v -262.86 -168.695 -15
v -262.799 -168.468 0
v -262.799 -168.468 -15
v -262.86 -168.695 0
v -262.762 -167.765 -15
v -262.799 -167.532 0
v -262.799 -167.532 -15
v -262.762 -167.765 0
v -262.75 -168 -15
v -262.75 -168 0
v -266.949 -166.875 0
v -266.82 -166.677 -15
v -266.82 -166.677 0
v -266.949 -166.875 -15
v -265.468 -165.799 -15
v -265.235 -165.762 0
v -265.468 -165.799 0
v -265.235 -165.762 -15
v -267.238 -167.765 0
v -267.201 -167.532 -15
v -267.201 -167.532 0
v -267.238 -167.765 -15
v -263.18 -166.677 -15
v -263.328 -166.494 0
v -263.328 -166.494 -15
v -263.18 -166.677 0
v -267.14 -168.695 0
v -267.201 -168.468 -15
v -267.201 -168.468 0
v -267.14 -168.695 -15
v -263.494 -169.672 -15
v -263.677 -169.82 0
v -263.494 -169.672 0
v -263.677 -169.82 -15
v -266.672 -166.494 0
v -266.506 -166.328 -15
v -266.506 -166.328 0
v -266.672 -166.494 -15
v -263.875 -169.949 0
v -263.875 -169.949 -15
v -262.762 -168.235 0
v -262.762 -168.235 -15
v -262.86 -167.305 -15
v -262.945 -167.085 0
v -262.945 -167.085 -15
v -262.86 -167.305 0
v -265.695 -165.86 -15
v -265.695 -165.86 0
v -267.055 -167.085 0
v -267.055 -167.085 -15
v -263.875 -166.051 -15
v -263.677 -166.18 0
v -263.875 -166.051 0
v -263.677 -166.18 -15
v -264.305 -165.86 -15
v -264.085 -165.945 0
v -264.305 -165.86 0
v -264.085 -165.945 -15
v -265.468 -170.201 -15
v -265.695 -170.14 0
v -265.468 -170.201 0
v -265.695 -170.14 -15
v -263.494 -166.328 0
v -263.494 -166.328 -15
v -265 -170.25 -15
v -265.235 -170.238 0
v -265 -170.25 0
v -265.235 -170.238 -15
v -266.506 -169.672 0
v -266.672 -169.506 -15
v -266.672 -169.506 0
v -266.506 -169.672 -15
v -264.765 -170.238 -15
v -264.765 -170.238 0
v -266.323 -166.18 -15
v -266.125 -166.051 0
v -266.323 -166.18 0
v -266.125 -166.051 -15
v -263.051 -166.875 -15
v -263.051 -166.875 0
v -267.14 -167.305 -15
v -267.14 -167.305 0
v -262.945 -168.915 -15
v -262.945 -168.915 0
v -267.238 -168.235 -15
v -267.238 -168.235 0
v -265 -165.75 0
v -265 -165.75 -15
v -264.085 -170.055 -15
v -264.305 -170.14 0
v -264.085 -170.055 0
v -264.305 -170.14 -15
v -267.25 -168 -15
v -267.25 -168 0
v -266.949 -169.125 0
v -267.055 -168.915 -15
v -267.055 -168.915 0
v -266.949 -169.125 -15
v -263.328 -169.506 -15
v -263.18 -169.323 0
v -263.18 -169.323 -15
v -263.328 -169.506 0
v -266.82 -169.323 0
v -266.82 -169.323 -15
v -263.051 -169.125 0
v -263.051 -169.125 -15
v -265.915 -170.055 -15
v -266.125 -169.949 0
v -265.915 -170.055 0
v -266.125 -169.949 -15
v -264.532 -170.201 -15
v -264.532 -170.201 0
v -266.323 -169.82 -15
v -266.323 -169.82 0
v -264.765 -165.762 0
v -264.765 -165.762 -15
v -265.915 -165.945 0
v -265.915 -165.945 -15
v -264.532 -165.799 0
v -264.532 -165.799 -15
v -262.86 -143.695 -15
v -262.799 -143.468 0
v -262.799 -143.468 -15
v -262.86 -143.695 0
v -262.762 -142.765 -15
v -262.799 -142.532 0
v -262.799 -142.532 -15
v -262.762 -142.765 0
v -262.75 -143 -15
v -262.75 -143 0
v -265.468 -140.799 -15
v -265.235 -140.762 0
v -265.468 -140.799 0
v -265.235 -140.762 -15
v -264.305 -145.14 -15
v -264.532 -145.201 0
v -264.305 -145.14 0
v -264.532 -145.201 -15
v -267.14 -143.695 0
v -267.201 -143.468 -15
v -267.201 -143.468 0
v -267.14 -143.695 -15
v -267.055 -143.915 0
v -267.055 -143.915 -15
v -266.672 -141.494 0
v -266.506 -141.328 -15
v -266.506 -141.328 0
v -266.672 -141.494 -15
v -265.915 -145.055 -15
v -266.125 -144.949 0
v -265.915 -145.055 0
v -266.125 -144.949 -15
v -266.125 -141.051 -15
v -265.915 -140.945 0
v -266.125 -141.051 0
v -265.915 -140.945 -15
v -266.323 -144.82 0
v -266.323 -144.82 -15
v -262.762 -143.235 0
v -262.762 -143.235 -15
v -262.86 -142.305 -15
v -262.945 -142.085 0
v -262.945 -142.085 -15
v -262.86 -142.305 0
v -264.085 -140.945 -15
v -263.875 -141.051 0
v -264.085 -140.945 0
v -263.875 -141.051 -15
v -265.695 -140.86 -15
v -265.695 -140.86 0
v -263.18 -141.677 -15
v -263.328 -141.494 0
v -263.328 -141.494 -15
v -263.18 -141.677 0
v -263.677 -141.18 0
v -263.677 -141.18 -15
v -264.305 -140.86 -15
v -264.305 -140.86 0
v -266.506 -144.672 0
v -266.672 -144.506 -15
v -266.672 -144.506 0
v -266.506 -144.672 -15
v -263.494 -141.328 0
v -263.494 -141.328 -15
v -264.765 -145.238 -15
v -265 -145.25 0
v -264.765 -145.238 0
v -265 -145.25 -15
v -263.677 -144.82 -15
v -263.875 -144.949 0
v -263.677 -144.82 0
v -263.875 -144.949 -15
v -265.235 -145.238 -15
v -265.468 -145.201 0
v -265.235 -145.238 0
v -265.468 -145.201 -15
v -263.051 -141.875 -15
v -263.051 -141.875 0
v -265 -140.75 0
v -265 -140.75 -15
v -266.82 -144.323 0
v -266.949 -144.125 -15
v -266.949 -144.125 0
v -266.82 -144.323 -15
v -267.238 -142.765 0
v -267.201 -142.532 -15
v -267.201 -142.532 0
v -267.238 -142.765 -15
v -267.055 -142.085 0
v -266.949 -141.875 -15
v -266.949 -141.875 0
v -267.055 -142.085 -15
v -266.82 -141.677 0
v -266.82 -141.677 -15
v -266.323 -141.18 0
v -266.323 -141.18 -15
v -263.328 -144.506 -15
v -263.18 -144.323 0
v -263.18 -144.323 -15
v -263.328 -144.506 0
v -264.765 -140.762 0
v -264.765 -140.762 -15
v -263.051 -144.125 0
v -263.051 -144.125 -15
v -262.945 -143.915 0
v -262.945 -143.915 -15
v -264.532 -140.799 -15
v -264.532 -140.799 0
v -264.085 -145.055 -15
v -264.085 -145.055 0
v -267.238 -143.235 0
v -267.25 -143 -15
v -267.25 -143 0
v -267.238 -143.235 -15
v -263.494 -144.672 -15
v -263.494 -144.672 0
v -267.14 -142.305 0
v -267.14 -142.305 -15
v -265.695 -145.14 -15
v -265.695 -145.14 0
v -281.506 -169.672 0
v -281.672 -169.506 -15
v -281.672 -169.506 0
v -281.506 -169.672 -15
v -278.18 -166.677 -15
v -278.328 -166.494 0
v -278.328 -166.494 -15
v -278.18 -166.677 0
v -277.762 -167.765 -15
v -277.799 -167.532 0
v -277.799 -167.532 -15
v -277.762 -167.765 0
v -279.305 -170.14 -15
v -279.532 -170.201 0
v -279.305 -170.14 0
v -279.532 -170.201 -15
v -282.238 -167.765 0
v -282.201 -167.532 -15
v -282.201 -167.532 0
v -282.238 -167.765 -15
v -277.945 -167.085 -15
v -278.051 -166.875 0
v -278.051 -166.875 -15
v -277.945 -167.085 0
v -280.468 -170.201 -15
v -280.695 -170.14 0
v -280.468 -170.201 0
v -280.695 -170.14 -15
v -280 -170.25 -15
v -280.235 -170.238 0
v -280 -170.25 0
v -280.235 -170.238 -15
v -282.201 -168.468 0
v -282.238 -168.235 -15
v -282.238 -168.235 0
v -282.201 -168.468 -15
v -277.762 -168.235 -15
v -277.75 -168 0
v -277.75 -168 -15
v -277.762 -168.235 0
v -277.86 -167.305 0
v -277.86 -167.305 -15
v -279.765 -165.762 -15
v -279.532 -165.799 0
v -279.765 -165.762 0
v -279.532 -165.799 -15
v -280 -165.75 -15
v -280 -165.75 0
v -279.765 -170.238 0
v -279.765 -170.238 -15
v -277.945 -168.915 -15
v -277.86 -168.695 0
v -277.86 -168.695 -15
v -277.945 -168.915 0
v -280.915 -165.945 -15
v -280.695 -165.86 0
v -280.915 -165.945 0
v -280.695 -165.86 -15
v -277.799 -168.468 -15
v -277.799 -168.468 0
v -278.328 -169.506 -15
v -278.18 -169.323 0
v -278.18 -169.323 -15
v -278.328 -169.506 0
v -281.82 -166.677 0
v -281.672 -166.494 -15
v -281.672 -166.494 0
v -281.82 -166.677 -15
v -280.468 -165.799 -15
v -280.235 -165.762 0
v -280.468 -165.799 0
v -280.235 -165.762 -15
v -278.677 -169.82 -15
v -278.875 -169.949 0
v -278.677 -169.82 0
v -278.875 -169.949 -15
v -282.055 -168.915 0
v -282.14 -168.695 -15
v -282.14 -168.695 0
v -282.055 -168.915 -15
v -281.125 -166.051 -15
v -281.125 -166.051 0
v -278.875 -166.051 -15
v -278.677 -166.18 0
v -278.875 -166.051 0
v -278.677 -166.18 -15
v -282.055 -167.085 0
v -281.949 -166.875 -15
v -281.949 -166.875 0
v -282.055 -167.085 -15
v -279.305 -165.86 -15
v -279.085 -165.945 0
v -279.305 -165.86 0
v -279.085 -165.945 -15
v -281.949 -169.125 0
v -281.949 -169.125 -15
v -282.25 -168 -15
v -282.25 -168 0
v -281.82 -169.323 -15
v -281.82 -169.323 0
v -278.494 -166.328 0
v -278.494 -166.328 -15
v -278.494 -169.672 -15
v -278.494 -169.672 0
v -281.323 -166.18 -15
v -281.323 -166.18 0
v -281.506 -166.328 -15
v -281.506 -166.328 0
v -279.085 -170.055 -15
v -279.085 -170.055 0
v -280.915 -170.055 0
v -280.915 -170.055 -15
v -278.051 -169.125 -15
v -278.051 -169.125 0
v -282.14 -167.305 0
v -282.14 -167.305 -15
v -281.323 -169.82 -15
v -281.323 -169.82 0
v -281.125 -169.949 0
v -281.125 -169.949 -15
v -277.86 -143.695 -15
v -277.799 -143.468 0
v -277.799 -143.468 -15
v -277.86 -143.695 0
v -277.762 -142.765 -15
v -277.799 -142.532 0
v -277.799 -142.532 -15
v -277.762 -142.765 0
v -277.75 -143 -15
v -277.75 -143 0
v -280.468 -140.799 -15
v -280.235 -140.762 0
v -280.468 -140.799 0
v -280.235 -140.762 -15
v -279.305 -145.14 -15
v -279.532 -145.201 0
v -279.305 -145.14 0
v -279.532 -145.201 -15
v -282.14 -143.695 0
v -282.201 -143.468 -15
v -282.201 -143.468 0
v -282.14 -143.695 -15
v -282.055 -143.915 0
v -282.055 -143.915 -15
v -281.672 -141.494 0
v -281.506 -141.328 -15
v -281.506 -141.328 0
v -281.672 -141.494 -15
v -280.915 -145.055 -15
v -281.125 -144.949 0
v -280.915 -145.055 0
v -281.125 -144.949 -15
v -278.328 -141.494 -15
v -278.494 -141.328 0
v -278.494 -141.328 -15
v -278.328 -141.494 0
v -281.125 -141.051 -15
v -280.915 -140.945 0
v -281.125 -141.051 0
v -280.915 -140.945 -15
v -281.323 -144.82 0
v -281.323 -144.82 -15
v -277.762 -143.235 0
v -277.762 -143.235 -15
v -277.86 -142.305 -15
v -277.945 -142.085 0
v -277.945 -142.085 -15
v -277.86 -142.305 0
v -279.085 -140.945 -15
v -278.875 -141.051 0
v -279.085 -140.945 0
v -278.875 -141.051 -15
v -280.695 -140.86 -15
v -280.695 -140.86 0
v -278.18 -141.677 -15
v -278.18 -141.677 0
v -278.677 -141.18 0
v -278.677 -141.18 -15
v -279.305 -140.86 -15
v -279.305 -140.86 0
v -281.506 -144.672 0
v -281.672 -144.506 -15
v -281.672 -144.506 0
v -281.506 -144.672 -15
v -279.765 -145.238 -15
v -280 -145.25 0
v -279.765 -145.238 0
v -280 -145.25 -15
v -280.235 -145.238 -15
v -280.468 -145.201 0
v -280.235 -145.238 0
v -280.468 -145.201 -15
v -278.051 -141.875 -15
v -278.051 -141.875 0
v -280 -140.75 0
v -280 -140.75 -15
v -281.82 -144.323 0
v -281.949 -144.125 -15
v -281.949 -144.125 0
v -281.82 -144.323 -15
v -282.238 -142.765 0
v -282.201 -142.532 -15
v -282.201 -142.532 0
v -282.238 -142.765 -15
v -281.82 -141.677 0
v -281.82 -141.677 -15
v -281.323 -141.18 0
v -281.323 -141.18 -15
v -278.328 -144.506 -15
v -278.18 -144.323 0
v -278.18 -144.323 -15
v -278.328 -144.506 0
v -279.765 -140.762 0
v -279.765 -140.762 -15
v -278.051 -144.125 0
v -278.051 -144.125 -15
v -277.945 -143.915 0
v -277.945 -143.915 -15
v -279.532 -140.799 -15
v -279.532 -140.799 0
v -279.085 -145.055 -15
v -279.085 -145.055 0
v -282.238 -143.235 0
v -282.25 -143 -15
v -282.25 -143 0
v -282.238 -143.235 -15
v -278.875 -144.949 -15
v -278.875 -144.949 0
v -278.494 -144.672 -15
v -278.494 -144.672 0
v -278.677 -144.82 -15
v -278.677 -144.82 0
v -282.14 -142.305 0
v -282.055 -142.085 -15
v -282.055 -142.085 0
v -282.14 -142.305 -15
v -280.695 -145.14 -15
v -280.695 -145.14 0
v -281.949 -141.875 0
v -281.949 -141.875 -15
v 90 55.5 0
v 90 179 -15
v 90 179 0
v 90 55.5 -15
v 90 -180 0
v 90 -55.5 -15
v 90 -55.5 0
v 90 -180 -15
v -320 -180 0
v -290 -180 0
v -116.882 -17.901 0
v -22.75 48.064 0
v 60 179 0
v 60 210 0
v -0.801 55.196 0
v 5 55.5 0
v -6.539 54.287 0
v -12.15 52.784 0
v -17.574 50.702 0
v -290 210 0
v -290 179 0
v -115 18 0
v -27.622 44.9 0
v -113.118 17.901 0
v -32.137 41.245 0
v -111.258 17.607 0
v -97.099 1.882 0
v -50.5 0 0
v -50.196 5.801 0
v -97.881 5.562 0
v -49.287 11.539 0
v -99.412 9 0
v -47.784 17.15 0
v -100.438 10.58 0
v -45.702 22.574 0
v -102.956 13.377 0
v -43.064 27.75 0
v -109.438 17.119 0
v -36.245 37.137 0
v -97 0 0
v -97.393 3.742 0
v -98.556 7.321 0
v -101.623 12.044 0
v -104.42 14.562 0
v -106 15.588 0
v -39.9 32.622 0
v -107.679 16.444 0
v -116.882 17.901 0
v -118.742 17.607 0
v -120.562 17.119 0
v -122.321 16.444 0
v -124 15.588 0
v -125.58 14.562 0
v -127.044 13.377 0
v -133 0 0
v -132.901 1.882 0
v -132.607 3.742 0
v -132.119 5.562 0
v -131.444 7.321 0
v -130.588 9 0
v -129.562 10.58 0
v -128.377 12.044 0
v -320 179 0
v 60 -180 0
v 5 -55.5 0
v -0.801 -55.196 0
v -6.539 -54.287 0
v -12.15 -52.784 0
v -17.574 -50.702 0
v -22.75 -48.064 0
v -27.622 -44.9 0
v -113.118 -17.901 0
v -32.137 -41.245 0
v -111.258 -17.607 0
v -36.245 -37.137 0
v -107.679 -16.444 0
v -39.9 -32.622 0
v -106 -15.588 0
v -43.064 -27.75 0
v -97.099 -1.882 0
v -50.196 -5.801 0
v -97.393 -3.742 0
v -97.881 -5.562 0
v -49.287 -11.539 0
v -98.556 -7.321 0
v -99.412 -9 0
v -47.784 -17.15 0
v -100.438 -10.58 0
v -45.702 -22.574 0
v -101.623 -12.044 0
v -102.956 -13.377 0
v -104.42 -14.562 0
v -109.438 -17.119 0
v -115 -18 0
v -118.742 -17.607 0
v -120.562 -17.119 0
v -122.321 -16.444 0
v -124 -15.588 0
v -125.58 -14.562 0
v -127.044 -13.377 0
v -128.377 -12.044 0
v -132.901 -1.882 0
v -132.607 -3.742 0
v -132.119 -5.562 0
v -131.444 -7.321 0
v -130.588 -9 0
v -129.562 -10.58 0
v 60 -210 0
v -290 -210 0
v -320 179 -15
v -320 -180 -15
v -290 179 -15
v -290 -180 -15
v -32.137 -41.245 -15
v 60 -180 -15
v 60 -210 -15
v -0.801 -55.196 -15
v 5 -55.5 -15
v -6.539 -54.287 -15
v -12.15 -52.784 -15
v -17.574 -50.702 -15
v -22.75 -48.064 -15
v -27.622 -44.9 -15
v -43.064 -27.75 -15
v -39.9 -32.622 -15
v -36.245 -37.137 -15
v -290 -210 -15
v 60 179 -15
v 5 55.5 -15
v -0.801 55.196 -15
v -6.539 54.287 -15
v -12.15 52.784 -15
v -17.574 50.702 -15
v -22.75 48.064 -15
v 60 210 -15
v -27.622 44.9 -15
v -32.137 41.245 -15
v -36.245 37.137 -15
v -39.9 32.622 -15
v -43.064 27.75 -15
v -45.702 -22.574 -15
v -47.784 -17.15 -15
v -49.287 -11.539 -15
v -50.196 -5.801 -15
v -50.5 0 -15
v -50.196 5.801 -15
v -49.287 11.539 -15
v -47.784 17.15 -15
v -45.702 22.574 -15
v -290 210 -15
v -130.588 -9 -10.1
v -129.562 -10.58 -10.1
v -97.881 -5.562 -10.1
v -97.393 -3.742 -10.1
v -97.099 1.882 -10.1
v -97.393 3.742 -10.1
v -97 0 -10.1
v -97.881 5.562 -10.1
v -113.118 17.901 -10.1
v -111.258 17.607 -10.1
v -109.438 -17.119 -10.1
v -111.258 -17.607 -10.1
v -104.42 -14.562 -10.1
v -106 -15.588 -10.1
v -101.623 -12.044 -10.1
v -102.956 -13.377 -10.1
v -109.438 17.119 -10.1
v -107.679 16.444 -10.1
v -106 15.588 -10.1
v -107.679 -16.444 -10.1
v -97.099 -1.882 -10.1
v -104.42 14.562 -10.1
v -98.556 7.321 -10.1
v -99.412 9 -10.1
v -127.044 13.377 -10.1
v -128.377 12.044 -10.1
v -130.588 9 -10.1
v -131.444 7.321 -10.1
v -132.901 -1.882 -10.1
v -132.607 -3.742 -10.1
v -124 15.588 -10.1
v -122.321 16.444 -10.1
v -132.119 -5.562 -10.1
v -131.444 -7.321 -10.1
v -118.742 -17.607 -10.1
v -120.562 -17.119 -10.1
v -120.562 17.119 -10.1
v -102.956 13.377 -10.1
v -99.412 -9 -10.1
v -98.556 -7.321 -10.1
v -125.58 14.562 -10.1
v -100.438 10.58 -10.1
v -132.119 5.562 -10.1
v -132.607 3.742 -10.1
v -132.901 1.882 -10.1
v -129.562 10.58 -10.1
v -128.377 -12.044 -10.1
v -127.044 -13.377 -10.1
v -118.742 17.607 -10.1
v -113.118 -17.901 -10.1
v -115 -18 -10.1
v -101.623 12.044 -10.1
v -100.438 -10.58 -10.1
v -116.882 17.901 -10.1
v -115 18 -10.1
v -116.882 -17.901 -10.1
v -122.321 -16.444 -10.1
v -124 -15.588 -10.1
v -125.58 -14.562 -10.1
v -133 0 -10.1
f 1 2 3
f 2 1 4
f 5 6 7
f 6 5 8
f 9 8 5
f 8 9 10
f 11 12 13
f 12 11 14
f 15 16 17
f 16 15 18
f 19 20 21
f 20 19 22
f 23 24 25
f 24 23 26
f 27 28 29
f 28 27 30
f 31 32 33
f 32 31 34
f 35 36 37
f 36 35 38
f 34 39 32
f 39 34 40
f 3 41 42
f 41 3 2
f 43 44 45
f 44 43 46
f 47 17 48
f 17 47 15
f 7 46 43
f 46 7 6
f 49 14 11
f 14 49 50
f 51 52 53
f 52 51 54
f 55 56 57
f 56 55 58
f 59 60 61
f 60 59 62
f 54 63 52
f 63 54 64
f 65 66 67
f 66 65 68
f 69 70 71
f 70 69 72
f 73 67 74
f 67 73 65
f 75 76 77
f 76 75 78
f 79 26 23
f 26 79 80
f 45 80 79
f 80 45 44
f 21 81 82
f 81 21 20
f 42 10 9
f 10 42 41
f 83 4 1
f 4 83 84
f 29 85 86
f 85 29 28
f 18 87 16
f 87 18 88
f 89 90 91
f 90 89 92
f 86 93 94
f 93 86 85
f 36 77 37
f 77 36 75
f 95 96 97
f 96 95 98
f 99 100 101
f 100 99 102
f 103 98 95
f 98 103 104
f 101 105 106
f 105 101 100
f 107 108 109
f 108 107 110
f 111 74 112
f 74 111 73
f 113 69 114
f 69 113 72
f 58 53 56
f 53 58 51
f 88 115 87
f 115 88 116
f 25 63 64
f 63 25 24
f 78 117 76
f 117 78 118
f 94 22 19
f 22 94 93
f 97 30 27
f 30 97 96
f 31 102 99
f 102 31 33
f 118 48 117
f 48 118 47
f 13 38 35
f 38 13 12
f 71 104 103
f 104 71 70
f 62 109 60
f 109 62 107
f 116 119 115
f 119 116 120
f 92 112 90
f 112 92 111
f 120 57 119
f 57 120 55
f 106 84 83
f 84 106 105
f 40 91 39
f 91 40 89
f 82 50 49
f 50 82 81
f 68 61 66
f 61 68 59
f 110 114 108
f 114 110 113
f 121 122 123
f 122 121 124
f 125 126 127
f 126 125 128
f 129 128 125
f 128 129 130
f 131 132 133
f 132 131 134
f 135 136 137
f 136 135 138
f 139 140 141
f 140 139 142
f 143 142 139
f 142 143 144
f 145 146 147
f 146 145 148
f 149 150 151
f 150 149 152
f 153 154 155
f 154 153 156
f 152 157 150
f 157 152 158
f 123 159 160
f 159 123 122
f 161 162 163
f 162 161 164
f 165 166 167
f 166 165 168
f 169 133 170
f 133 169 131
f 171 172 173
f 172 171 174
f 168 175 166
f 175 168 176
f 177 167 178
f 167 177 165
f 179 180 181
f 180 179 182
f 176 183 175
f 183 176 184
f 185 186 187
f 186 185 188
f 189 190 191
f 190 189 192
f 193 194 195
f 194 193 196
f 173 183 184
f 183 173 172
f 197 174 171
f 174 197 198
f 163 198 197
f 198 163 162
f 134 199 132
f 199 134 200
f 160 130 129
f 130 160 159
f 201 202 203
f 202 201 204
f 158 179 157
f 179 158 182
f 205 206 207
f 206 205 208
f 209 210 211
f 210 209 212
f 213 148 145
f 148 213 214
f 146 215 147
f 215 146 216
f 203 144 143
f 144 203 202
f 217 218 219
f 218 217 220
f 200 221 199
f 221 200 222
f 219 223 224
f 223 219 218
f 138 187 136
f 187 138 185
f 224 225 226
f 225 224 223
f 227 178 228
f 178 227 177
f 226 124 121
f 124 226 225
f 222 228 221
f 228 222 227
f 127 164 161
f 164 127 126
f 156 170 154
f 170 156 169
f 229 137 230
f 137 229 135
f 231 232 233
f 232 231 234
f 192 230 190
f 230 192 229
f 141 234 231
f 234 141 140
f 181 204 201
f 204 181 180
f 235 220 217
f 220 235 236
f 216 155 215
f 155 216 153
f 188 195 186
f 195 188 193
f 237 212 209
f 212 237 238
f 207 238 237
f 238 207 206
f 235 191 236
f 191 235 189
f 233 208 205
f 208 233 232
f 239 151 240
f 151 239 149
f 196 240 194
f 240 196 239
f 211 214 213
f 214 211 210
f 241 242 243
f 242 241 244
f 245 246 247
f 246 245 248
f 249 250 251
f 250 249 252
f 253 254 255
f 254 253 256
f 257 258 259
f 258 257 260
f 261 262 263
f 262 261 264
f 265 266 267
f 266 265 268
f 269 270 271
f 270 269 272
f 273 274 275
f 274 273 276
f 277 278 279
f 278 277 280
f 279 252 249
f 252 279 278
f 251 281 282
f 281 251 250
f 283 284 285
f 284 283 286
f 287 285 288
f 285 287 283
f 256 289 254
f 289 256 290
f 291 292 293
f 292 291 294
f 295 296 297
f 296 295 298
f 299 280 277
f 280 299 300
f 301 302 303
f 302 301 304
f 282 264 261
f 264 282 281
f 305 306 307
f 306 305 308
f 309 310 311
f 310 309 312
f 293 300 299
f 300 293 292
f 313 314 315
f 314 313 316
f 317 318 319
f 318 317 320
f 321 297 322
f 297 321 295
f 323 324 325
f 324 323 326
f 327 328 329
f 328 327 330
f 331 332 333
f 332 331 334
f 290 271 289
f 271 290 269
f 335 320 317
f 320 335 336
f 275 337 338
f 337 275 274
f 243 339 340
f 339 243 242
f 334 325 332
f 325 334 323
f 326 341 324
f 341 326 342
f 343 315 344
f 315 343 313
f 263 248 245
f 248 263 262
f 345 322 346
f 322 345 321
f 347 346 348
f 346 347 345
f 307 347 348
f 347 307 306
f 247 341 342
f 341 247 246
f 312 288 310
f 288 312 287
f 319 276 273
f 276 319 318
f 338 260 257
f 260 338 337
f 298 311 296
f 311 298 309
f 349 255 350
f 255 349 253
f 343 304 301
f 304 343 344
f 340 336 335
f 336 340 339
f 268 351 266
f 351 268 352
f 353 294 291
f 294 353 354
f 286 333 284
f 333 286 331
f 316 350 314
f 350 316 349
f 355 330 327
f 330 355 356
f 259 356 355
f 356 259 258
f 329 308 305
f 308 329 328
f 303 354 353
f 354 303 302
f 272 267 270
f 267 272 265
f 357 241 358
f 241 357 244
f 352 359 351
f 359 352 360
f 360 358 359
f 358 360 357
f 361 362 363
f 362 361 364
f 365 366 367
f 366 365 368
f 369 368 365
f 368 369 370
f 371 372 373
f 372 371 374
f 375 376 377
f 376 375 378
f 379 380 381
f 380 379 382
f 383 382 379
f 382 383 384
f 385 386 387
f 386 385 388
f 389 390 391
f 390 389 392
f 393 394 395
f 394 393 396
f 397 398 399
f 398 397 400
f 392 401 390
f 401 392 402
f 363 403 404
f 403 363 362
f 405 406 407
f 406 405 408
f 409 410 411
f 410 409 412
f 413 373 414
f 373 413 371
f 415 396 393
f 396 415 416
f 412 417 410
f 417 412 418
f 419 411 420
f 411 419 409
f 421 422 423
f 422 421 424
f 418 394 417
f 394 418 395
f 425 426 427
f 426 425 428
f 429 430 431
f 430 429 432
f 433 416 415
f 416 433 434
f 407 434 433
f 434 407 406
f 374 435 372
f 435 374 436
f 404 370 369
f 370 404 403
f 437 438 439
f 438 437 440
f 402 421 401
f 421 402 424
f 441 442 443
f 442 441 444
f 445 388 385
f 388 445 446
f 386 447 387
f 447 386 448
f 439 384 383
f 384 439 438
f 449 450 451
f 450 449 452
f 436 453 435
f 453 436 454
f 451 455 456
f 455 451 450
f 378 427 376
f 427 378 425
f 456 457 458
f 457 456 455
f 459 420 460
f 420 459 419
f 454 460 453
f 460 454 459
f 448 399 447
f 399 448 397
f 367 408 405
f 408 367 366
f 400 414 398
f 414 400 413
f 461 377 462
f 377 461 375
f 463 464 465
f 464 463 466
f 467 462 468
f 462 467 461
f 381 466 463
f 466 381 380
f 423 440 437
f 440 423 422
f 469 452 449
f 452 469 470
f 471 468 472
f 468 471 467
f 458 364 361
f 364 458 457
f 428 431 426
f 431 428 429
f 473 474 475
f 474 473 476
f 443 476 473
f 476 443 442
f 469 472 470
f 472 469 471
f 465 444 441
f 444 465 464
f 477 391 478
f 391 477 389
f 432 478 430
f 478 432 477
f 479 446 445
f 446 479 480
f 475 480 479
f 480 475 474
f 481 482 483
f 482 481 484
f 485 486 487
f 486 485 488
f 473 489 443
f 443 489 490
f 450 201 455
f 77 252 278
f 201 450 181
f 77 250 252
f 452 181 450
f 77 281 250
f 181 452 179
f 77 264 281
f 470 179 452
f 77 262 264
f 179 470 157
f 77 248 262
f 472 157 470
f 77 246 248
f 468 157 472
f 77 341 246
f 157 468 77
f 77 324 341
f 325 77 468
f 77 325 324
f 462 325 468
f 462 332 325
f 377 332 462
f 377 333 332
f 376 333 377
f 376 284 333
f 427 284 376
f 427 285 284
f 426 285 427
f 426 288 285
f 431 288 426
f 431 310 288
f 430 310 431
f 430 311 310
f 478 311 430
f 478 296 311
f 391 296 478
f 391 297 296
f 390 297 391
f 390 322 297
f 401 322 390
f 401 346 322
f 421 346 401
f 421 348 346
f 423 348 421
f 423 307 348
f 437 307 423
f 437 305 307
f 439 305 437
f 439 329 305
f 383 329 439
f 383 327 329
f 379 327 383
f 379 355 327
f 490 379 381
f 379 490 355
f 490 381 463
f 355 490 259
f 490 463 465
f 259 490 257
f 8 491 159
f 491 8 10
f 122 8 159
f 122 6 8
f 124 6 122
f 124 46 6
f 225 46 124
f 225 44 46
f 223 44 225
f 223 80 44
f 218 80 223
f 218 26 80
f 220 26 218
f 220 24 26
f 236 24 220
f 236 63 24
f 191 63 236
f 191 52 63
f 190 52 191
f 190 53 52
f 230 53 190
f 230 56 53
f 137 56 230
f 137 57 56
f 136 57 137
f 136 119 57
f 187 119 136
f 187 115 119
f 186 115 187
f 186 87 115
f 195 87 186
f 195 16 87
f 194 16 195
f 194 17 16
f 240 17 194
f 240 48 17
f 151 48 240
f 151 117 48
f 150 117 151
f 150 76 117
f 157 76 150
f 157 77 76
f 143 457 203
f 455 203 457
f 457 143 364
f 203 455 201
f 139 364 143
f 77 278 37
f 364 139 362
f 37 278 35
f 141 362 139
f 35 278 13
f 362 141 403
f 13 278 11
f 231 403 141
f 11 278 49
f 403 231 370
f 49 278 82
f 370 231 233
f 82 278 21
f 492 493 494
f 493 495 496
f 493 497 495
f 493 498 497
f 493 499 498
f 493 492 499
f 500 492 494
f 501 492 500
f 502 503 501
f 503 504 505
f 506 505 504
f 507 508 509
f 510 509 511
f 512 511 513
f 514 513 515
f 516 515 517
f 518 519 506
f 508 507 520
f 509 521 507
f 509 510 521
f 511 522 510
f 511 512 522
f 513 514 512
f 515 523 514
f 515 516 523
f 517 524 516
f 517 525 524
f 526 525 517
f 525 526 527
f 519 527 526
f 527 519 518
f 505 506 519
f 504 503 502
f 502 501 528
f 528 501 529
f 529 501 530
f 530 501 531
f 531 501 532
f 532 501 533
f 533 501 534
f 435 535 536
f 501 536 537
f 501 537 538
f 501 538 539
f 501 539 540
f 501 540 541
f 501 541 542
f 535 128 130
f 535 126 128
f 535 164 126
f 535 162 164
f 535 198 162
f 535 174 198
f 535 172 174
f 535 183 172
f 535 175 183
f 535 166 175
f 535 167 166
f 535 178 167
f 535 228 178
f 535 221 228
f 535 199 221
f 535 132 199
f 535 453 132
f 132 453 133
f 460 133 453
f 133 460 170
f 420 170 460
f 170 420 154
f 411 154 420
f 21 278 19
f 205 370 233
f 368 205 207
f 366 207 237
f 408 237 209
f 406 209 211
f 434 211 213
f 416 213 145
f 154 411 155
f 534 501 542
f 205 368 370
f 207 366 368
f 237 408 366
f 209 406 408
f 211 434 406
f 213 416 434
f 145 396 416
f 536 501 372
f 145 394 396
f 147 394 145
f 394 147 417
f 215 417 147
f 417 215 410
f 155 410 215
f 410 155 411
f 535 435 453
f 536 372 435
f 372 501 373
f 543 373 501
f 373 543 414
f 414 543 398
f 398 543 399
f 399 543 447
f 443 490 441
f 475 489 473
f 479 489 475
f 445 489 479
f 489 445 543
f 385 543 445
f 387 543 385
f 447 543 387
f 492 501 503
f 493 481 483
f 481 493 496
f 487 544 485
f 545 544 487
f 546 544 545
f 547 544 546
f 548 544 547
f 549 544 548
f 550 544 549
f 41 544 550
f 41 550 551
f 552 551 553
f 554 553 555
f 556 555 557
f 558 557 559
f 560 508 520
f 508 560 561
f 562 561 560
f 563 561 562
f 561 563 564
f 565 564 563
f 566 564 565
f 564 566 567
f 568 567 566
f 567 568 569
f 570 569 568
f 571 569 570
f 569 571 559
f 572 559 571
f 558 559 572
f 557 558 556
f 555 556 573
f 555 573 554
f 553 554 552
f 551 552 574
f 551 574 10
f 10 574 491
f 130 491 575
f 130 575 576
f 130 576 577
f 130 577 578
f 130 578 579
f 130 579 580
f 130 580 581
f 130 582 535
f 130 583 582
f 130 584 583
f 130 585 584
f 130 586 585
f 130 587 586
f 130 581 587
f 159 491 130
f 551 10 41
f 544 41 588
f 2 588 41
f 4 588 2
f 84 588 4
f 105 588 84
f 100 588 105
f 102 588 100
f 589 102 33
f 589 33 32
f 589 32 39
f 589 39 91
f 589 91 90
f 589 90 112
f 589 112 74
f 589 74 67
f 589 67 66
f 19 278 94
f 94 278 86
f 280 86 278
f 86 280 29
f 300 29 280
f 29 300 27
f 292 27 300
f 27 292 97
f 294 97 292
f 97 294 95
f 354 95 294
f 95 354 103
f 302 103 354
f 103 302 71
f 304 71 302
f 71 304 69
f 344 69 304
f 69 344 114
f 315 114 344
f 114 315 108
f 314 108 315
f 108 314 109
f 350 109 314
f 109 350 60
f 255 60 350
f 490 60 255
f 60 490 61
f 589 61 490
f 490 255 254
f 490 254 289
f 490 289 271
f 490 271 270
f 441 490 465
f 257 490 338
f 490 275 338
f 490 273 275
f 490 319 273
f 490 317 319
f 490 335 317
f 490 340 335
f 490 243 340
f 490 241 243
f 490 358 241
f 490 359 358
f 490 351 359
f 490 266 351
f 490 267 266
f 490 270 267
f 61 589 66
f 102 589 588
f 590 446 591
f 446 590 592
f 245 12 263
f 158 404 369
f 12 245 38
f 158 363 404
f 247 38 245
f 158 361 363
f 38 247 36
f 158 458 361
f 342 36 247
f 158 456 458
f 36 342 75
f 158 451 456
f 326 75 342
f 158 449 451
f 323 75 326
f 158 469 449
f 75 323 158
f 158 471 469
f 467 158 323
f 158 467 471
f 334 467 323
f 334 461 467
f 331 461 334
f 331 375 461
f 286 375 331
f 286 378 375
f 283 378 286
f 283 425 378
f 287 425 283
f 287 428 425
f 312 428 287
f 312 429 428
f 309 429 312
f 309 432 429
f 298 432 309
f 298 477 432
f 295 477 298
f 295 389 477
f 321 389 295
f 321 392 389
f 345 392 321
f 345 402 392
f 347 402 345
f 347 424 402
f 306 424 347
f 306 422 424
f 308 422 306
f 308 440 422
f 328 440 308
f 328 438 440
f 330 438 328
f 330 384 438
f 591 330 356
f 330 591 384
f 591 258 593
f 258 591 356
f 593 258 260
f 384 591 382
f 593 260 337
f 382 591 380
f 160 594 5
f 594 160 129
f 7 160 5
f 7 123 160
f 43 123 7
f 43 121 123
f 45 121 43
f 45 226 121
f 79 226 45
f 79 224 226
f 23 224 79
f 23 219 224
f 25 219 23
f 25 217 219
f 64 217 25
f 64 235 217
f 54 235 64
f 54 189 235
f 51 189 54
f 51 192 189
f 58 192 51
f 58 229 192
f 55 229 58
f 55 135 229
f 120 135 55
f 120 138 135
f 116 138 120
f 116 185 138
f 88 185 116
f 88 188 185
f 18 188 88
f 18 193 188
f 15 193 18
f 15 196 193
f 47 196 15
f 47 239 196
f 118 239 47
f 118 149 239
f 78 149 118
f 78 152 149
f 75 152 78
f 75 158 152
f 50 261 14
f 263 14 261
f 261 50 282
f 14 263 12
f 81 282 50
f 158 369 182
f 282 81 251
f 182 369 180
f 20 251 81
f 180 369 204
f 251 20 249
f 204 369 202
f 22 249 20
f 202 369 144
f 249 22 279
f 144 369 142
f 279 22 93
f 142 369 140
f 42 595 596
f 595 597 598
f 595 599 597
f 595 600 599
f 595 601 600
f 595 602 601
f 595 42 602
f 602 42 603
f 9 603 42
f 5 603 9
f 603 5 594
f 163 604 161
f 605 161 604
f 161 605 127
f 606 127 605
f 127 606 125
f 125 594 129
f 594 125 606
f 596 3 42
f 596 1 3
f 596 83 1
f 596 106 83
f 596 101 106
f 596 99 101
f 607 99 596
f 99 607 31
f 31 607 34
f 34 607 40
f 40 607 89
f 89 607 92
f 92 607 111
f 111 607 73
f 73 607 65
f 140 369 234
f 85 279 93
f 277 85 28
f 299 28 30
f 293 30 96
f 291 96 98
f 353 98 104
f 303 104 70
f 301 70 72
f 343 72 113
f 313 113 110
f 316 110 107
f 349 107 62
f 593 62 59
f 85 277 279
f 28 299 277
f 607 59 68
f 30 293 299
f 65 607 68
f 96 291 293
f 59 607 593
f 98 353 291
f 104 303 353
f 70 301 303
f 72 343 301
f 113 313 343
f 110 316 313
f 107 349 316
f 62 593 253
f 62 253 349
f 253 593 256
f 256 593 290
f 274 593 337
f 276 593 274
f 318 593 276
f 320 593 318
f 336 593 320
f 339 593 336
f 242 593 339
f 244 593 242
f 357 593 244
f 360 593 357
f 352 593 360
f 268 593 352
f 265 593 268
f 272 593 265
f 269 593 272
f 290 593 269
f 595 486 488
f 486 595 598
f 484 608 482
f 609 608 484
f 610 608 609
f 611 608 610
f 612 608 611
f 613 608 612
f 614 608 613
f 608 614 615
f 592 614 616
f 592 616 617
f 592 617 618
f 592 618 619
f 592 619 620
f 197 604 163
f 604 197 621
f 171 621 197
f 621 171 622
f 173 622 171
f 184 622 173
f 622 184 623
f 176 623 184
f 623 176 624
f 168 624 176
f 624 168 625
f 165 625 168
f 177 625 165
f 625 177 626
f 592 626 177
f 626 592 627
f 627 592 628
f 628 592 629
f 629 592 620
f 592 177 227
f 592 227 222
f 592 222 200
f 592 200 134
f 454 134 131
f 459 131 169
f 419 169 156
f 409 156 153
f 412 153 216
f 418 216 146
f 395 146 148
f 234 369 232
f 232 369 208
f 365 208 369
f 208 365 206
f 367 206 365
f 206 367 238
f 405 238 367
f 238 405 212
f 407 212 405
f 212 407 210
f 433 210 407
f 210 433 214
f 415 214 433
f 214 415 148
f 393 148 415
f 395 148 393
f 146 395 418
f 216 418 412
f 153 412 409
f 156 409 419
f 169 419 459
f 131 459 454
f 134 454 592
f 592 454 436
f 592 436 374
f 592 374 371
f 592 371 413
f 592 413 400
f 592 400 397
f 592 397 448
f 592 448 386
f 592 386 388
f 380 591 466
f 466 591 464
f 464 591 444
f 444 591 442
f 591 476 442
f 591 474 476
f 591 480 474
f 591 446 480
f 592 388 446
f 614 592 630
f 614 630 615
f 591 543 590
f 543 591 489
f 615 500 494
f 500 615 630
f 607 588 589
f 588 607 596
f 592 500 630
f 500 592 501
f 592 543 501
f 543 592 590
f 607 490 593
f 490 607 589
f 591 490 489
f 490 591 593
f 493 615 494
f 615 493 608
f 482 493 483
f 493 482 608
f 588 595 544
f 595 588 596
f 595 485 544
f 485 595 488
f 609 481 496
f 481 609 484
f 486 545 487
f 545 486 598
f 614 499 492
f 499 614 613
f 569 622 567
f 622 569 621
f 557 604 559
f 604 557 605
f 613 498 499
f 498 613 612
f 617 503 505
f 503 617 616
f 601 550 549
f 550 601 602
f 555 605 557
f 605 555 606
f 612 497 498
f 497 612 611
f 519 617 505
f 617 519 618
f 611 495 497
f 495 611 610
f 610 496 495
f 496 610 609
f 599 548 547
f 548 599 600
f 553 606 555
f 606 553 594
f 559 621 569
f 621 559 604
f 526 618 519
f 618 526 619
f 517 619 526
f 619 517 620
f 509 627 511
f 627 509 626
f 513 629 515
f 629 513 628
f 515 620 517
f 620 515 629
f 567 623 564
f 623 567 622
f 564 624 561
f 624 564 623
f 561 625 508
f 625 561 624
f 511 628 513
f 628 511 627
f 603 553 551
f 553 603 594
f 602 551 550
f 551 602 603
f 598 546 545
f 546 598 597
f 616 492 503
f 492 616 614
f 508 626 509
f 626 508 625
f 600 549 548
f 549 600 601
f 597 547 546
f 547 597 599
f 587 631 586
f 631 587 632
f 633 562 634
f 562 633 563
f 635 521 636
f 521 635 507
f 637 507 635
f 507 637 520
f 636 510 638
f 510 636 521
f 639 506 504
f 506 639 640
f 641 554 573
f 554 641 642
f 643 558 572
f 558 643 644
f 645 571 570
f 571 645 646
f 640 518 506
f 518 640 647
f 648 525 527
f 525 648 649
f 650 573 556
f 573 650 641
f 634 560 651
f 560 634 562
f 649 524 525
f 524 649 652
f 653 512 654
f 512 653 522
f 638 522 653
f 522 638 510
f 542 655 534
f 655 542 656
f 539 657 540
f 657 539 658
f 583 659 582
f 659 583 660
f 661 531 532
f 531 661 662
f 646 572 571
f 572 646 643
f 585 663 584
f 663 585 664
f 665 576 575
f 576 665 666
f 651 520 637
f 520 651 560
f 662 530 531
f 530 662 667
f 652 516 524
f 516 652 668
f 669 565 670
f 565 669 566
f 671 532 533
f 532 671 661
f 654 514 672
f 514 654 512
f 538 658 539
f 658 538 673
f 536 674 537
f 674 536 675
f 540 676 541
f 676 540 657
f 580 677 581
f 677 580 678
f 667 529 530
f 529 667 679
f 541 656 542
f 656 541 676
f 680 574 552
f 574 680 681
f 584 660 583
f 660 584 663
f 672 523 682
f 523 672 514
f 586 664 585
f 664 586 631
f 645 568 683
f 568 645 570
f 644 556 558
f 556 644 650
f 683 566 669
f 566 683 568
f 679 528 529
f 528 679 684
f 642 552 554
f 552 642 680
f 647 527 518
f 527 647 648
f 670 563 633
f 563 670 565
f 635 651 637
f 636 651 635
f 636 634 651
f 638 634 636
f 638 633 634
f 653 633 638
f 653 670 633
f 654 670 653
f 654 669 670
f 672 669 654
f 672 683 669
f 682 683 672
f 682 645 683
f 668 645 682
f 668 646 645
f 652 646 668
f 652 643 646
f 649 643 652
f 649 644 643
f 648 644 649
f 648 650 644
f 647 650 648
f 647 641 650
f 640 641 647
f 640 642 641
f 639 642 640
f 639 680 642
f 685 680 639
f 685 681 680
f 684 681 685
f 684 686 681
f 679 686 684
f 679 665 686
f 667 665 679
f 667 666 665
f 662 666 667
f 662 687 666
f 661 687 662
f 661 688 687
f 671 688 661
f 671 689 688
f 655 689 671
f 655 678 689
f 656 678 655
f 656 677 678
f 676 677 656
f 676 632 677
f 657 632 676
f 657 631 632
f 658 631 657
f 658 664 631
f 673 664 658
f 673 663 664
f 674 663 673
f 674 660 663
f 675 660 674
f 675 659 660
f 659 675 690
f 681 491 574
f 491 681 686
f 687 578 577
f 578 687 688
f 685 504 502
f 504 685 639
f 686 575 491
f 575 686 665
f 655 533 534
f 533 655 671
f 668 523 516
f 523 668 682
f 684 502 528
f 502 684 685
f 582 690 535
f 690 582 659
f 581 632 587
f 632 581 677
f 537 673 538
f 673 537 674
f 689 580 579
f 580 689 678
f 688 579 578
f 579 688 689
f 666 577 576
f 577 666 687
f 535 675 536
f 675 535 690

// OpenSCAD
// file: _params.scad
// =========================================================================
// 공유 파라미터 (모든 개별 부품 파일에서 include)
// 메인 어셈블리: cup_z_x_catrage_frame_water_mic_anti_3030.scad 에서 추출
// 프레임: 600 × 420 × 700mm (3030 프로파일, Y=0 대칭)
// =========================================================================

$fn = 60;  // 부품 출력용 고해상도
GLOBAL_TOLERANCE = 0.2;

// --- [1] 하부 기성품 및 원통 파라미터 ---
X_RAIL_LEN = 290.0;
X_BLOCK_W = 30.0; X_BLOCK_L = 32.0;   // 신규 X슬라이더 블록 (폭 30mm × 길이 32mm)
X_PITCH_X = 20.0; X_PITCH_Y = 20.0;   // 체결 홀 피치 (20 × 20mm, M3 나사탭 4개)
X_RAIL_W = 30.0;  X_RAIL_H = 20.0;   // 레일 폭 30mm (레일 바닥~블록 윗면 높이 29mm 반영)
X_TOTAL_H = 29.0;                    // 레일 바닥에서 슬라이더 블록 윗면까지의 높이

MOTOR_W = 42.0;      MOTOR_PITCH = 31.0; MOTOR_HOLE_D = 3.5;    
MOTOR_BOSS_D = 22.0; MOTOR_BOSS_H = 2.0; SCREW_D = 8.0;         
MOT_BODY_L = 41.0;   SHAFT_L = 24.0;     // 실측 NEMA17 몸통 41mm / 축 돌출 24mm

CUP_ID = 99.5;  CUP_WALL = 5.0; CUP_OD = 110.0;     // 아크릴 원통 OD110/ID100
CUP_H = 180.0;   CAGE_H = 60.0;  FLOOR_H = 10.0; PISTON_H = 20.0;     

LIP_D = 30.0;    LIP_H = 5.0;    LEAK_DRAIN_D = 4.0;    
GUIDE_PIPE_D = 8.0; BUSHING_OD = 12.0; BUSHING_H = 8.0;       
DRAIN_RADIUS = 35.0; DRAIN_D = 8.0;        

Y_OFFSET = 85.0; BRKT_H = 12.0; BRKT_D = 122.0; BRKT_ID = 62.0; Z_MOUNT_PCD = 86.0;   

// --- [2] 아크릴 파이프 및 상부 카트리지 ---
ACRYL_ID = 100.0; ACRYL_T = 5.0; ACRYL_OD = ACRYL_ID + (ACRYL_T * 2);  // OD110 (아크릴집 106 재고없음 → 컵과 동일 규격)

REVOLVER_PCD = 240.0;     // 인접 카트리지 웹 9.8mm 확보 (OD110 대응, 230→240)
CARTRIDGE_OD = REVOLVER_PCD + ACRYL_OD + 8; 
TOP_PLATE_H = 15.0;       // 아크릴 15T 통판 (보스홀 단 깊이 10mm)

HUB_D = 60.0;            
SHAFT_D = 12.0;          
HUB_WALL = 4.0;          
HUB_H = 15.0;             // 아크릴 5T × 3장 적층 — 파이프 130mm 대응
POCKET_DEPTH = 5.0;
MID_HUB_Z = 63.5;          // 중단 허브 하면 Z (벨트 중심 Z=71.0mm 정렬, 풀리 상단 Z=75.0mm = 축상단-1mm)
UPPER_HUB_Z = 135.0;       // 상단 허브 하면 Z (전체 135+15=150 유지)
BOSS_OD = 35.0;
BOSS_H = 11.0;             // 보스11 + 와셔1 = 12, 리세스10 → 허브 2mm 공중

// --- [3] GT2 벨트 구동 시스템 ---
GT2_PITCH     = 2.0;
GT2_BELT_W    = 6.0;
BIG_PULLEY_TEETH = 566;
BIG_PULLEY_PD = BIG_PULLEY_TEETH * GT2_PITCH / PI;
BIG_PULLEY_OD = BIG_PULLEY_PD + 1.0;
SMALL_PULLEY_TEETH = 20;
SMALL_PULLEY_PD = SMALL_PULLEY_TEETH * GT2_PITCH / PI;
SMALL_PULLEY_OD = SMALL_PULLEY_PD + 1.0;

BELT_MOTOR_X = -300;
BELT_MOTOR_Y = -155.5;
BRKT_MOTOR_H = 25.0;
BRKT_MOTOR_W = 45.0;        // 브래킷 폭 45mm (프로파일 간섭 회피 복원)
SLOT_LEN = 10.0;
FLAG_W = 15.0;  FLAG_H = 8.0;  FLAG_T = 1.5;

X_POS_MEASURE = 170.0;   // 측정 브래킷 X좌표 (X_M~X_R 정중앙, X대칭)

// --- [4] 3030 프레임 경계 (600×430×700mm) ---
PF = 30;             // 3030 알루미늄 프로파일
WASHER_T = 1.0;     

X_L = -320;
X_M = 60;
X_R = 250;
Y_F = -210;          // 전방 (대칭: -210+30=-180, Y=0 중심)
Y_B = 180;           // 후방 (대칭: 180+30=210, Y=0 중심) — 메인파일과 동기화

Z_BOT = -480;
Z_RAIL = -322;
Z_MID = -TOP_PLATE_H - PF;
Z_TOP = 220;

SUPPORT_PILLAR_H = Z_TOP - PF;

SHAFT_SQ = 20;       // 2020 사각 회전축

// 사각 축 홀 크기
SQ = SHAFT_SQ + GLOBAL_TOLERANCE;  // 20.2mm

// --- 리볼버/컵 축 정렬 (보스홀=판 중심에 리볼버 정렬) ---
REVOLVER_CX = (X_L + X_M + PF)/2;        // 판 중심 = 보스홀 = 리볼버 회전축 (-115)
DROP_X      = REVOLVER_CX + REVOLVER_PCD/2;  // 링 드롭 / 컵 적재 축 (+5)

FLANGE_Z = 52.0;       // 모터 전면 안착 높이 (Z=52mm -> 축 상단 Z=76mm, 풀리 결합)

// --- [5] 모터 체결홀 (이미 제작 완료된 15T 상판 원본 도면 수치 100% 유지) ---
MOTOR_BOLT_PITCH     = 25.0;      // Y피치 (Y = ±12.5mm)
MOTOR_BOLT_X_NOMINAL = X_L + 55;  // 1열: 상판 좌단 55 (모터축 기준 +35mm = X=-265mm)
MOTOR_BOLT_X_SHIFT   = X_L + 40;  // 2열: 상판 좌단 40 (모터축 기준 +20mm = X=-280mm)

// 모터 마운트 볼트 카운터보어 (단볼트용 — 브래킷 두께 25 중 깊게 파냄)
MOTOR_CB_D     = 6.5;            // M3 캡볼트 머리 클리어런스
MOTOR_CB_DEPTH = 19;             // 카운터보어 깊이 (잔여 통과 6mm → M3×10 단볼트)
// main file
// =========================================================================
// [부품] 상판 (Upper Fixed Base Plate)
// 가공: 아크릴 15T 통판 (보스홀 ⌀36 깊이 10mm 비관통 단가공)
// 원점: 상판 상면 = Z=0, XY = 메인 어셈블리 원점 동일
// =========================================================================
include <_params.scad>

difference() {
    translate([X_L, Y_F, -TOP_PLATE_H])
        cube([(X_M + PF) - X_L, (Y_B + PF) - Y_F, TOP_PLATE_H]);
    // 기둥 회피홈 (4곳, 정확히 PF=30mm — kerf로 자연 여유 확보)
    translate([X_L - 1, Y_B - 1, -TOP_PLATE_H - 1])
        cube([PF + 1, PF + 1, TOP_PLATE_H + 2]);
    translate([X_L - 1, Y_F - 1, -TOP_PLATE_H - 1])
        cube([PF + 1, PF + 1, TOP_PLATE_H + 2]);
    translate([X_M, Y_B - 1, -TOP_PLATE_H - 1])
        cube([PF + 1, PF + 1, TOP_PLATE_H + 2]);
    translate([X_M, Y_F - 1, -TOP_PLATE_H - 1])
        cube([PF + 1, PF + 1, TOP_PLATE_H + 2]);
    // 컵 관통 개구부 (적재축 DROP_X=+5에 정렬)
    translate([DROP_X, -(CUP_OD + 1)/2, -TOP_PLATE_H - 1])
        cube([CARTRIDGE_OD, CUP_OD + 1, TOP_PLATE_H + 2]);
    translate([DROP_X, 0, -TOP_PLATE_H - 1])
        cylinder(d=CUP_OD + 1, h=TOP_PLATE_H + 2);
    // 하단 보스 수용 블라인드홀 (REVOLVER_CX=판 중심=리볼버 축에 정렬)
    translate([REVOLVER_CX, 0, -10.1])
        cylinder(d=36, h=10.2);
    // 모터 브래킷 체결홀 (X 2열: 55=기본, 40=좌측이동 / Y피치 25)
    for(hx = [MOTOR_BOLT_X_NOMINAL, MOTOR_BOLT_X_SHIFT])
        for(hy = [BELT_MOTOR_Y - MOTOR_BOLT_PITCH/2, BELT_MOTOR_Y + MOTOR_BOLT_PITCH/2])
            translate([hx, hy, -TOP_PLATE_H - 1])
                cylinder(d=4.5, h=TOP_PLATE_H + 2);
}
